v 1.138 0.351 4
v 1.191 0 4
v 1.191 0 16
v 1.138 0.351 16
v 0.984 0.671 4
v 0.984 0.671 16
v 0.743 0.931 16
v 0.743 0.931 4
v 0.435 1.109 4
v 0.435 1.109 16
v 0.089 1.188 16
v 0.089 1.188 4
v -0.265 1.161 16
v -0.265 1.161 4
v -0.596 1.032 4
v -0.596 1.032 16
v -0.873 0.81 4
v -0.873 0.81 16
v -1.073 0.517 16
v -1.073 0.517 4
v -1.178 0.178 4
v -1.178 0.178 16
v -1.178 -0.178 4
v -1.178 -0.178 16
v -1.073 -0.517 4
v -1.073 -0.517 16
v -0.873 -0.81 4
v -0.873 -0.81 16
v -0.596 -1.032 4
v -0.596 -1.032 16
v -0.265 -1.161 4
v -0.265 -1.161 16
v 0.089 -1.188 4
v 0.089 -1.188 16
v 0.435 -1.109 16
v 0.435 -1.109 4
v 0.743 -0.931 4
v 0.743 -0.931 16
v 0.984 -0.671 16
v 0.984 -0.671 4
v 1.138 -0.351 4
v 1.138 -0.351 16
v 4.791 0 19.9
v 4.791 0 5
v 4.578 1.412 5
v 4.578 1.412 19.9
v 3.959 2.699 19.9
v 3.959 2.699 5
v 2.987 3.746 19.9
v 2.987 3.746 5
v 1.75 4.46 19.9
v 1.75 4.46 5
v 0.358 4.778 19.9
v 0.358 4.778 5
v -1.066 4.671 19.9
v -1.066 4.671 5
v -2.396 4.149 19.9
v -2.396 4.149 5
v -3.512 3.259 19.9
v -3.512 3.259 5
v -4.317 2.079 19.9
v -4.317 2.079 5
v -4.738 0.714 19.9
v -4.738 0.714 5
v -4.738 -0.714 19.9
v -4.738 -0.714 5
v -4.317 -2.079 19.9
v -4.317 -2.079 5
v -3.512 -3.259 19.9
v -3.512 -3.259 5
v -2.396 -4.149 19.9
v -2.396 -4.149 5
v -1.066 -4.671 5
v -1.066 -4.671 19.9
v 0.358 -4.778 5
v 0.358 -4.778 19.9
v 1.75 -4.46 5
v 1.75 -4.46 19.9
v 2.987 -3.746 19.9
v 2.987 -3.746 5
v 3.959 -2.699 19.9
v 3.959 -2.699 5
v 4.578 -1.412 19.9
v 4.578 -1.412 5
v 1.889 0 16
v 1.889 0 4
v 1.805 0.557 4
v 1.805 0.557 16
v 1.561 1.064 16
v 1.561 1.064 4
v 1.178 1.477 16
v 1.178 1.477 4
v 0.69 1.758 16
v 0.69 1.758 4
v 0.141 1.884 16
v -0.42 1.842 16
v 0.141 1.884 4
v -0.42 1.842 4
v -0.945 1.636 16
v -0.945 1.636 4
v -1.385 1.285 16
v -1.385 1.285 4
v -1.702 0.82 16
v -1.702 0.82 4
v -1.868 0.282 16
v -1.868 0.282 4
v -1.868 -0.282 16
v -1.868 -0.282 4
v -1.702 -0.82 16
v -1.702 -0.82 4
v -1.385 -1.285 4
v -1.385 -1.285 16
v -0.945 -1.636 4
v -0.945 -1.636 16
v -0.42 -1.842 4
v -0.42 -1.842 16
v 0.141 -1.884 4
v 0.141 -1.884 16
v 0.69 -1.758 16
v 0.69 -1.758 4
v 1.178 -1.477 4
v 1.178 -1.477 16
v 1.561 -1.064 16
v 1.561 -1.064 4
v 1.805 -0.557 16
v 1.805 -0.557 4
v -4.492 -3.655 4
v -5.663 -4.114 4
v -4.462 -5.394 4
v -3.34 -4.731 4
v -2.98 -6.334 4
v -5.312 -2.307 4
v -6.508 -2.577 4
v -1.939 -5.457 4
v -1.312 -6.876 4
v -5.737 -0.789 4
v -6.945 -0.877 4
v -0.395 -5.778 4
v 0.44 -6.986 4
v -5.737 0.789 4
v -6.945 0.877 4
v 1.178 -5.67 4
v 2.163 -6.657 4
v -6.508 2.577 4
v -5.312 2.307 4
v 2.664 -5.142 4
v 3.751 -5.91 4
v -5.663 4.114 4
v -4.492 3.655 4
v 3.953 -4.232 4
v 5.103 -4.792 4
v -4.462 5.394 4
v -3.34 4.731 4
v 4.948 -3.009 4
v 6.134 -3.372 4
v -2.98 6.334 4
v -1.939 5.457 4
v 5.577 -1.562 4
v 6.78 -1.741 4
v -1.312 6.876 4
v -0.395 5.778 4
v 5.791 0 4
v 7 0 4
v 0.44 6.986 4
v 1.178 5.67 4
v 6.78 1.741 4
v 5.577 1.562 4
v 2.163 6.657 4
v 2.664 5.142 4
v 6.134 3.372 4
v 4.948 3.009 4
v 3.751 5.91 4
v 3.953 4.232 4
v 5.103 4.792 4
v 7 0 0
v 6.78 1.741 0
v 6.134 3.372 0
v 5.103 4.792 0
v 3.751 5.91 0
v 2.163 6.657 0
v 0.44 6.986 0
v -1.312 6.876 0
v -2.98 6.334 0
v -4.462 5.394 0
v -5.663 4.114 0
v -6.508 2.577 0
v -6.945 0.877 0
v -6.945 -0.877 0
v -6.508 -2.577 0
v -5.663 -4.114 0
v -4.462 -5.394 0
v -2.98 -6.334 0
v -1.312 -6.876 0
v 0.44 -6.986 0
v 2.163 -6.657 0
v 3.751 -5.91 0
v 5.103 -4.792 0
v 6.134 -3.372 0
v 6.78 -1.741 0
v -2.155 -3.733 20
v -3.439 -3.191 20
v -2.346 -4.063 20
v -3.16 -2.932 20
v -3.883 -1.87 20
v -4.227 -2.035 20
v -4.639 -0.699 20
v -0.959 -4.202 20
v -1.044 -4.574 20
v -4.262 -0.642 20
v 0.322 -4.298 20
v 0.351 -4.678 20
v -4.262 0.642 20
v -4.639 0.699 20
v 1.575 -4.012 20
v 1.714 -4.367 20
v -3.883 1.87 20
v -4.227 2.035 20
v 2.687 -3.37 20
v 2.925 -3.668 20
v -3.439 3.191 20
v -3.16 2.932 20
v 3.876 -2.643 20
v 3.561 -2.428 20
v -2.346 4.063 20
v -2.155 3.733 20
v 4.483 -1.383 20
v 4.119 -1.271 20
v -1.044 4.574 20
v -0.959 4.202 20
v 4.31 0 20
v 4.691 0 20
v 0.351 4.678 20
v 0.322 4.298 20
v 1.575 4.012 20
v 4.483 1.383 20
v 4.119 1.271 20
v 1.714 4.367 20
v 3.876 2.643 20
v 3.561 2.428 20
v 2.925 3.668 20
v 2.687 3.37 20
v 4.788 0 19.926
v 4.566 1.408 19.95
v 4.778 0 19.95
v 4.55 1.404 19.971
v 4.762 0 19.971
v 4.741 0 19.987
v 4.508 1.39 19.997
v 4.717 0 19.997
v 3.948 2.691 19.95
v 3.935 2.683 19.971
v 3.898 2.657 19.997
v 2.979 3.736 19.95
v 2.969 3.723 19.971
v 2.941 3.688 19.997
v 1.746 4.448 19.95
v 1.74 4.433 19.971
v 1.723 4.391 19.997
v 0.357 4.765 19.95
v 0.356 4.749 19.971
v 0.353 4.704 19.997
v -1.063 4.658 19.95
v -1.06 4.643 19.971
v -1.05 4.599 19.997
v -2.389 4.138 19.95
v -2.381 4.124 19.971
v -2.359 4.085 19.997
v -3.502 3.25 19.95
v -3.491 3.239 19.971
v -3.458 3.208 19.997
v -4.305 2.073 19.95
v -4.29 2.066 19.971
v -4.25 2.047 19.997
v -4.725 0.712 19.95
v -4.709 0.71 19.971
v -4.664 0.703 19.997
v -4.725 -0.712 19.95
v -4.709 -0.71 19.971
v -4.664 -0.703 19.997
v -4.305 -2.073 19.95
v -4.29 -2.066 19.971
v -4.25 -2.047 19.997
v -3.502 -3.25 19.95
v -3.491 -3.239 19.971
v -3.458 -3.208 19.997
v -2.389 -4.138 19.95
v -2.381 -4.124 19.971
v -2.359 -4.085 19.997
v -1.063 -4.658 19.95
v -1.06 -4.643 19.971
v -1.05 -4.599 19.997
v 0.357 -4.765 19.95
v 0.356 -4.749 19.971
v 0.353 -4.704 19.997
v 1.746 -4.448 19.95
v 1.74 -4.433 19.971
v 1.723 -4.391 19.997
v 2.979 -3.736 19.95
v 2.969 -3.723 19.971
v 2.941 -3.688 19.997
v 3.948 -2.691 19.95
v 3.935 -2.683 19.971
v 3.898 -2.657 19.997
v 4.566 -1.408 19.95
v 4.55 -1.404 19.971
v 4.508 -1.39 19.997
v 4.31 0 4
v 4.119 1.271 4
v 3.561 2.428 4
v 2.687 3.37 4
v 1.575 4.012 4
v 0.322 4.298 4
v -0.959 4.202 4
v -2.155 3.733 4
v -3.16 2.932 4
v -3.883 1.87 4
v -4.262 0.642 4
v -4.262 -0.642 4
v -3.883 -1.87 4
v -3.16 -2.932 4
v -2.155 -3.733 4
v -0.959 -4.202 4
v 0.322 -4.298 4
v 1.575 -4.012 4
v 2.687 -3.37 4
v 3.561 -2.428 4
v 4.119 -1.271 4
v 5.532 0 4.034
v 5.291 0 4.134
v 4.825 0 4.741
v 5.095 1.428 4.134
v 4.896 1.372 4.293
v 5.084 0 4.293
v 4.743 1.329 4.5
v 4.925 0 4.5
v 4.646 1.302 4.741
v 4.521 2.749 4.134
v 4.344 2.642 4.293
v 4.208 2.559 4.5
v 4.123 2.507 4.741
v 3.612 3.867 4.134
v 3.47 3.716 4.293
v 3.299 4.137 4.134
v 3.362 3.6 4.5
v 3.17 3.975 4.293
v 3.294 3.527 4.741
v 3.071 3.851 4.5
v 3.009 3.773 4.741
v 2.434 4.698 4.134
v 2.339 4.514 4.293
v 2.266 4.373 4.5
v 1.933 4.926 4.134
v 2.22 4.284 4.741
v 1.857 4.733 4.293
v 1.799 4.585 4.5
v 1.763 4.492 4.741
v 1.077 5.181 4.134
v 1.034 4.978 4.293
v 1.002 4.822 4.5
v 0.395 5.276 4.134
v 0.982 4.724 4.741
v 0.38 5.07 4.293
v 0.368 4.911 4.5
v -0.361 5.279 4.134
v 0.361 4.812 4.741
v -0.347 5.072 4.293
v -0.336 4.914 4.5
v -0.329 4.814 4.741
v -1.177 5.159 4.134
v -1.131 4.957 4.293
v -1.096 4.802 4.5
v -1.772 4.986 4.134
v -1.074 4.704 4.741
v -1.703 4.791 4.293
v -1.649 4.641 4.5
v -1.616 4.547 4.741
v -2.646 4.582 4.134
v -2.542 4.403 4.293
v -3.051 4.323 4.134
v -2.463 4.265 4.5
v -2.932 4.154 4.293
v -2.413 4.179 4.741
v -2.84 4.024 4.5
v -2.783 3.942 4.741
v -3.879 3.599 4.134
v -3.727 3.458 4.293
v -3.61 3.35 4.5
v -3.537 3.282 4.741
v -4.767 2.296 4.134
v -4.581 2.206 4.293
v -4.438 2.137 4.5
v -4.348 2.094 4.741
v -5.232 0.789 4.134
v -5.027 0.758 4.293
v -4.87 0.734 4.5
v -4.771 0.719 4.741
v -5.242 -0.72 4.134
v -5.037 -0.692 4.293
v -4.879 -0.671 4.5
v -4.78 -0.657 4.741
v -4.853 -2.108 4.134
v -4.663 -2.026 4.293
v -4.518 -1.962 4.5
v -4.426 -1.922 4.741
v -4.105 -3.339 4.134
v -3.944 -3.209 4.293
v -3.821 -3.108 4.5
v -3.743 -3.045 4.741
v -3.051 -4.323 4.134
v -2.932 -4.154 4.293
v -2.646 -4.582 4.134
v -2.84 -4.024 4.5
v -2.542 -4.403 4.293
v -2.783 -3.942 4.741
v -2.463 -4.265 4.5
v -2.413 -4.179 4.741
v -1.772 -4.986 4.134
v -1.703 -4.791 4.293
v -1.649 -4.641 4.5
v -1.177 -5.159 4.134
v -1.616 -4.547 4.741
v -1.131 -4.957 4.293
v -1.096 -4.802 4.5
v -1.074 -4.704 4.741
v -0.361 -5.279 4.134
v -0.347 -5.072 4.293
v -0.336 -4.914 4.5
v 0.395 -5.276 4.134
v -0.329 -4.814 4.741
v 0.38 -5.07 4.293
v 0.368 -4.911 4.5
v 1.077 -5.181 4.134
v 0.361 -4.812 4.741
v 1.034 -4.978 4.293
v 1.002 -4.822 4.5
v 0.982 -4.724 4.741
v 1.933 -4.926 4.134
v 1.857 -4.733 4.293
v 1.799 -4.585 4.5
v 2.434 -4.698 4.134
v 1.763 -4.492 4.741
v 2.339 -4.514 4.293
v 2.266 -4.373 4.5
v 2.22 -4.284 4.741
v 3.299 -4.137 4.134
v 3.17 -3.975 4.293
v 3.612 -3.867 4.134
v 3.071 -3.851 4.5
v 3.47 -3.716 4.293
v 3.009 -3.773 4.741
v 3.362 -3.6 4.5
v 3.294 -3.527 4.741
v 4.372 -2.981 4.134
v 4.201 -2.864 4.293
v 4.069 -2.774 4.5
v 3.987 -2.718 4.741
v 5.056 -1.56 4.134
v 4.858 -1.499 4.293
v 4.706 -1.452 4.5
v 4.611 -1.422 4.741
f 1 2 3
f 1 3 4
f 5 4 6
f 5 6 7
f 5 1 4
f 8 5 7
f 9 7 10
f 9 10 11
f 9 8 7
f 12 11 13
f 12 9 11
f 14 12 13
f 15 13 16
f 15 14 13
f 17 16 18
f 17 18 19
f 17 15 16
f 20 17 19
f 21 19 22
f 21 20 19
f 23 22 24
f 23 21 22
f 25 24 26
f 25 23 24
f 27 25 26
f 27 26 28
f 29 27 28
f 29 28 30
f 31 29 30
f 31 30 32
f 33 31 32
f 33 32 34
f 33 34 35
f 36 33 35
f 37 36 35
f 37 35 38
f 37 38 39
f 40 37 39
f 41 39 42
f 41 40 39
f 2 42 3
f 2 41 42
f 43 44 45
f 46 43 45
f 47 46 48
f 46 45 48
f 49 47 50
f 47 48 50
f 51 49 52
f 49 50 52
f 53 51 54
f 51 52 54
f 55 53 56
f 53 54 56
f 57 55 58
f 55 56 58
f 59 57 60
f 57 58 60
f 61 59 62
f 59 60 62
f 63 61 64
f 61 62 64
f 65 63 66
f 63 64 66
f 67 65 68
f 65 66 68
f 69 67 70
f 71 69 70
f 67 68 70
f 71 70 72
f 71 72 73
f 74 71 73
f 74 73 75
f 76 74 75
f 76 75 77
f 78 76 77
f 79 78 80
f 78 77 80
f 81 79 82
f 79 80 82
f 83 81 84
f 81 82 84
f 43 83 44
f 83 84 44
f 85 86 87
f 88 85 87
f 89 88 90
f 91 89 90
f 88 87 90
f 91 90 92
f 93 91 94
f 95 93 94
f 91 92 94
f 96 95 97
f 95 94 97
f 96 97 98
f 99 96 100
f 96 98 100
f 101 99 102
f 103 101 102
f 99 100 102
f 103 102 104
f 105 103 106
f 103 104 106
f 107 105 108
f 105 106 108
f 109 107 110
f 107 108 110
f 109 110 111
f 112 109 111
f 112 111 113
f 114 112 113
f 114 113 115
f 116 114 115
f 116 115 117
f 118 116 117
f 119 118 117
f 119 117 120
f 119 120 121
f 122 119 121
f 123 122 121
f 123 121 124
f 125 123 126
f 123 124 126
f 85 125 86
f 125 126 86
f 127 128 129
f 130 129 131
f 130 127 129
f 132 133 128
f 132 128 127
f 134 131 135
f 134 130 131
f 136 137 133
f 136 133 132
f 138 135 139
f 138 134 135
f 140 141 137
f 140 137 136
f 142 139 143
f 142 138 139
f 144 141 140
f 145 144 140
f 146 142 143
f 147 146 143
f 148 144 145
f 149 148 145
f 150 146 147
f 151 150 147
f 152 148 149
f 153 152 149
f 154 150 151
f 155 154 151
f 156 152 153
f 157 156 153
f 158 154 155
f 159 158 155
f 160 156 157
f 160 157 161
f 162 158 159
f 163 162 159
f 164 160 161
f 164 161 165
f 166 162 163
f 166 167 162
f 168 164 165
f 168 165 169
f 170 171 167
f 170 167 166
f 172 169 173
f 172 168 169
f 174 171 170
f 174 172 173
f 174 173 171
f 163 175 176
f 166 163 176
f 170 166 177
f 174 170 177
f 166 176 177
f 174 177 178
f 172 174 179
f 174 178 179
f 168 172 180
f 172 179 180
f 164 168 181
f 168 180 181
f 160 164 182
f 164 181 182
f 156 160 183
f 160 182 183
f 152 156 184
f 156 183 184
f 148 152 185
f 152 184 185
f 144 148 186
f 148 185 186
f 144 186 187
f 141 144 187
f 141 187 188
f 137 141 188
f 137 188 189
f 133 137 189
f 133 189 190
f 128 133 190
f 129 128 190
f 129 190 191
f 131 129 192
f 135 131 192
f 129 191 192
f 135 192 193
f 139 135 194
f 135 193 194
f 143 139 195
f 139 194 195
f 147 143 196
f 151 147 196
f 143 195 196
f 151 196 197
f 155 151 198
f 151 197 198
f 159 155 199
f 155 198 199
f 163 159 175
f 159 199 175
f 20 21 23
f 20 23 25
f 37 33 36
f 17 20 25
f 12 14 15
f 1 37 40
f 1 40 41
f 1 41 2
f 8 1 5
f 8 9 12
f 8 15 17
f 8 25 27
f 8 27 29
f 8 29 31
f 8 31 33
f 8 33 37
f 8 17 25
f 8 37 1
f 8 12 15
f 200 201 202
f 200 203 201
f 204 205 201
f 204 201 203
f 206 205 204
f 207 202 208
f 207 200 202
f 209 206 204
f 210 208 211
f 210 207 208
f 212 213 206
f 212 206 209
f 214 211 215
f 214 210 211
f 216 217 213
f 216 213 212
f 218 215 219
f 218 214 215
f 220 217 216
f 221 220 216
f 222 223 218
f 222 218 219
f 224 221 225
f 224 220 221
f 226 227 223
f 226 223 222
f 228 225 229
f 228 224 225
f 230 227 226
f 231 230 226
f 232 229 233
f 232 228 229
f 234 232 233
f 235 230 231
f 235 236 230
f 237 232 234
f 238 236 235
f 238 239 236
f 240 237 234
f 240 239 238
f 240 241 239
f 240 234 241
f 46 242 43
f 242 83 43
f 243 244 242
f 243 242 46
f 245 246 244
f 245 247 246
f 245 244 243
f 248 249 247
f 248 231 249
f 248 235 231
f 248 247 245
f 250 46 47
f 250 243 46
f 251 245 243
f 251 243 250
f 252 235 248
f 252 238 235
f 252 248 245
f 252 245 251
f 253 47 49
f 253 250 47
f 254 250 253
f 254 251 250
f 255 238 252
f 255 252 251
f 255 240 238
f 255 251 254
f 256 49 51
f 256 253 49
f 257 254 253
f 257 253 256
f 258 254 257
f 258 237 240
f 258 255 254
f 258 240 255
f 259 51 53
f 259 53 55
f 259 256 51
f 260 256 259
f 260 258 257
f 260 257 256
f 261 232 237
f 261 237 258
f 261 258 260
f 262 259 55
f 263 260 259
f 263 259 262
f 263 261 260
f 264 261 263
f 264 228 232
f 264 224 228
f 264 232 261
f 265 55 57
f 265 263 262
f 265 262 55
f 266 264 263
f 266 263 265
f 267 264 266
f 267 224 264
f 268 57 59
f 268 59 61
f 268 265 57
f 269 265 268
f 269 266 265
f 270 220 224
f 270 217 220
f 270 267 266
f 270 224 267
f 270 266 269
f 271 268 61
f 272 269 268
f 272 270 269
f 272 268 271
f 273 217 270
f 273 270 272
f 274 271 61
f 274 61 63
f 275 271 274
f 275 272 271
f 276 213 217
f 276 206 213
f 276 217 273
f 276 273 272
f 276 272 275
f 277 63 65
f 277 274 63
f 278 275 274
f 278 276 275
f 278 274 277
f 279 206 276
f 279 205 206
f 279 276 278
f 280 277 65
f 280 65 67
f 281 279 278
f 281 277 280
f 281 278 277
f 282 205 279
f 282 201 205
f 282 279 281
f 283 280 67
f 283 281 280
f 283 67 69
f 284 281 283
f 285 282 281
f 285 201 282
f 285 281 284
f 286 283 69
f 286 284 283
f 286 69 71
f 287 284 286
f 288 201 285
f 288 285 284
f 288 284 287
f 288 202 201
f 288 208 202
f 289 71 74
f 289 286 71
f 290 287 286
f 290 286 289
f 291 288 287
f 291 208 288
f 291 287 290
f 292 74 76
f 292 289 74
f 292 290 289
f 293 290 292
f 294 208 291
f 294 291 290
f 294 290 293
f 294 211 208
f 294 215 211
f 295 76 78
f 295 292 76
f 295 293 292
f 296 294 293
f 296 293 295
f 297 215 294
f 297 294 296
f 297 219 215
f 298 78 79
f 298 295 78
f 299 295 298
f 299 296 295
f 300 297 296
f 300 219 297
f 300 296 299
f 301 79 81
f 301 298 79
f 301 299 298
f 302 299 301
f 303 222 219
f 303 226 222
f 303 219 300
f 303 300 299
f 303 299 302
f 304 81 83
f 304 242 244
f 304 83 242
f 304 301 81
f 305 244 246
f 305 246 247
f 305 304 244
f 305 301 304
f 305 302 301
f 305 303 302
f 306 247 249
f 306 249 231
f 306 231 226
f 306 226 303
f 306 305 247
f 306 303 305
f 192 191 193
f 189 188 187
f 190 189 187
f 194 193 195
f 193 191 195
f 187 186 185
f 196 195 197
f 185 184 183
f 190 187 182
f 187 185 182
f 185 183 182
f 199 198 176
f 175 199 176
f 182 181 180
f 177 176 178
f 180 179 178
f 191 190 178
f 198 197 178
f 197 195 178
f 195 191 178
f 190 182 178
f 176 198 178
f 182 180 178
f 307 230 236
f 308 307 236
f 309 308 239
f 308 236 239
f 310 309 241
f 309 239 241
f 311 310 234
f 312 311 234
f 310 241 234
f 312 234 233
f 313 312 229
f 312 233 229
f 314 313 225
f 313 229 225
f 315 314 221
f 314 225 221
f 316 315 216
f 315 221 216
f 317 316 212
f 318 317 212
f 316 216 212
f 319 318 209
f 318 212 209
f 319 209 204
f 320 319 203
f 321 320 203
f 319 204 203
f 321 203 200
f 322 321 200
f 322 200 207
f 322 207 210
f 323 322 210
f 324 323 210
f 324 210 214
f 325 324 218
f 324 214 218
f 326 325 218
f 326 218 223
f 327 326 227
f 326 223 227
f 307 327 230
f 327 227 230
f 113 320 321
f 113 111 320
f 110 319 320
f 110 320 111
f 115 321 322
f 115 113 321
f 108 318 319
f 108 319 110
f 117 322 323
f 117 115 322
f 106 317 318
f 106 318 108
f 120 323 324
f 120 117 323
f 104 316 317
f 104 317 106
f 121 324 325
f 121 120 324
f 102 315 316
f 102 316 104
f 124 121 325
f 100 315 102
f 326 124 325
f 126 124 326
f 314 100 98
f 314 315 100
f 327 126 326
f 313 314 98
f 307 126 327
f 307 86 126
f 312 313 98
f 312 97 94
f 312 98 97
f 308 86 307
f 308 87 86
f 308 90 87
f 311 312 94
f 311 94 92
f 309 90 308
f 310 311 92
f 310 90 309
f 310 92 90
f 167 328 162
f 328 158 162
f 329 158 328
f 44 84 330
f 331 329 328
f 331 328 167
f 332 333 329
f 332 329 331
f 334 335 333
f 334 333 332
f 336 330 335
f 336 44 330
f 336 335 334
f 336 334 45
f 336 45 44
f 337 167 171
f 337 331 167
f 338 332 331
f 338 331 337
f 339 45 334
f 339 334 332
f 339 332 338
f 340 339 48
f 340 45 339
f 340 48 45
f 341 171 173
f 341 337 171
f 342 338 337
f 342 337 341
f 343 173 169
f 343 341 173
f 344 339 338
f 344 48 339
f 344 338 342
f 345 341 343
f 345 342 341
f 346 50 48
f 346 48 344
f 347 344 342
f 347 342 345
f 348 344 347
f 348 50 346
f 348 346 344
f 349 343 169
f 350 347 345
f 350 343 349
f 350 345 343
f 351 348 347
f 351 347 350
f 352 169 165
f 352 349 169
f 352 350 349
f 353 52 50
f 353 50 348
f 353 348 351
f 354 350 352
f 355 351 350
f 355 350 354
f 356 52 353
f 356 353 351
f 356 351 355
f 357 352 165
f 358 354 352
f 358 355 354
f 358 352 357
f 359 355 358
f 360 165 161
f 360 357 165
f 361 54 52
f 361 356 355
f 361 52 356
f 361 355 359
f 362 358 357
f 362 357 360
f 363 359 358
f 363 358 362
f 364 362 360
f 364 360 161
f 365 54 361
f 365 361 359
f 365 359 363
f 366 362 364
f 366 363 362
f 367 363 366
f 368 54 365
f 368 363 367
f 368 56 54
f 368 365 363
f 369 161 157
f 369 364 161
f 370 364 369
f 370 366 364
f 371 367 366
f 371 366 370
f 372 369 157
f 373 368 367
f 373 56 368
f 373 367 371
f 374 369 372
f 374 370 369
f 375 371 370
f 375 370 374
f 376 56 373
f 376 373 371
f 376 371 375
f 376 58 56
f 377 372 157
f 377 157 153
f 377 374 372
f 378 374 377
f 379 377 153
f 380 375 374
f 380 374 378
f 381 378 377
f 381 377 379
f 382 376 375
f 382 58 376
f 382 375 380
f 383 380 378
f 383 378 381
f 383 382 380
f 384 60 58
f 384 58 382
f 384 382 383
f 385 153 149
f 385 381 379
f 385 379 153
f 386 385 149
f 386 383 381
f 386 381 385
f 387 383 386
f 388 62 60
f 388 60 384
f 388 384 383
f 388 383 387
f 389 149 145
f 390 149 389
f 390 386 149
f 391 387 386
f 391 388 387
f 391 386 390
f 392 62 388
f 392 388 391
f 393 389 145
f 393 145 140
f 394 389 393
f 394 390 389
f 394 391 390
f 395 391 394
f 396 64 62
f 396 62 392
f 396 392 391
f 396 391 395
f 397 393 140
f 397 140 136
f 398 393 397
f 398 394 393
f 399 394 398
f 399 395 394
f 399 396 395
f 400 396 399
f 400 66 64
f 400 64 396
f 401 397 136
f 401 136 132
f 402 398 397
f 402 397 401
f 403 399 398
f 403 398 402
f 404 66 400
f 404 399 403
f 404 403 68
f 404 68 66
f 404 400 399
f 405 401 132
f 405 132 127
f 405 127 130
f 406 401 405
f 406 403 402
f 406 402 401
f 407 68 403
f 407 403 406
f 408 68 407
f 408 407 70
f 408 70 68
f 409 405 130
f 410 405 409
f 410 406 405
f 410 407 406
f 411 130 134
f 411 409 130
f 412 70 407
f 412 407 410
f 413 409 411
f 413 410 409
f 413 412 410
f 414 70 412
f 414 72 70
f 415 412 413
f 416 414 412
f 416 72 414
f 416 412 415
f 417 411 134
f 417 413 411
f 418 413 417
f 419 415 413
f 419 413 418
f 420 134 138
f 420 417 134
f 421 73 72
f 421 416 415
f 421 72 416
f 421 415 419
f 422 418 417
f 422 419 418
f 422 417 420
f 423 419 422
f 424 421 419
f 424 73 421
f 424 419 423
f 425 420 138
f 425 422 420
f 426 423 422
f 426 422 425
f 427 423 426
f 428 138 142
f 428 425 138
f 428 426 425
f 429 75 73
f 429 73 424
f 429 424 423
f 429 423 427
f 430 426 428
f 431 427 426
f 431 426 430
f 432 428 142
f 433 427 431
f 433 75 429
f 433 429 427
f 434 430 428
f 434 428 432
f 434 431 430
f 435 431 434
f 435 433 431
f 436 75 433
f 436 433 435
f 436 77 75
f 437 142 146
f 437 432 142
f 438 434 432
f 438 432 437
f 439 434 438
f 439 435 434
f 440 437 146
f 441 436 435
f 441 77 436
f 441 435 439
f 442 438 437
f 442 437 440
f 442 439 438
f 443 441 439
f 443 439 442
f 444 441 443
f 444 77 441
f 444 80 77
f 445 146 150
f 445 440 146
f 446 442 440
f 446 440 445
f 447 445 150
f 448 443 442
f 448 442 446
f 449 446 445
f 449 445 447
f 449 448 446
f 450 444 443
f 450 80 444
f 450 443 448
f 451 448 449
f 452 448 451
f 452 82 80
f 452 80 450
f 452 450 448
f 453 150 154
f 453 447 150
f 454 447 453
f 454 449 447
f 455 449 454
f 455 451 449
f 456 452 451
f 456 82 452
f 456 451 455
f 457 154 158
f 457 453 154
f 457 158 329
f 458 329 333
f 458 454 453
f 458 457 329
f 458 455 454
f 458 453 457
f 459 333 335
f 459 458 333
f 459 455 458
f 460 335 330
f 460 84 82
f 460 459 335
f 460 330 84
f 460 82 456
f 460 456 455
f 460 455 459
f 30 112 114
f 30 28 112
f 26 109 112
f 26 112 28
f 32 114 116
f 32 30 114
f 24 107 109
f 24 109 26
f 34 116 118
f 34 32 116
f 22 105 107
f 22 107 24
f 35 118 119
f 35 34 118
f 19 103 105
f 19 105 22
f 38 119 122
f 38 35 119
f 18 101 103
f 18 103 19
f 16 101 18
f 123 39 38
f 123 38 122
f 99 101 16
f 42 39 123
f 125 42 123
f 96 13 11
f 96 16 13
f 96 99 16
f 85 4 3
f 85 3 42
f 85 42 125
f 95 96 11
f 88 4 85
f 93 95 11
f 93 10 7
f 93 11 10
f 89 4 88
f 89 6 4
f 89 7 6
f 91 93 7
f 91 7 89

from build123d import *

# Parameters (mm, degrees)
SKETCH1_R           = 7
BOSS_EXTRUDE1_DEPTH = 4
SKETCH2_R           = 4.791287292
BOSS_EXTRUDE2_DEPTH = 16
SKETCH3_R           = 4.310359808
CUT_EXTRUDE1_DEPTH  = 16
SKETCH4_R           = 1.889075337
SKETCH4_R_2         = 1.191130081
BOSS_EXTRUDE3_DEPTH = 12
FILLET1_R           = 1
FILLET2_R           = 0.1


with BuildPart() as part:
    # Sketch1 → Boss-Extrude1 (new body)
    with BuildSketch(Plane.XY):
        Circle(SKETCH1_R)
    extrude(amount=BOSS_EXTRUDE1_DEPTH)

    # Sketch2 → Boss-Extrude2 (add)
    with BuildSketch(Plane.XY.offset(4)):
        Circle(SKETCH2_R)
    extrude(amount=BOSS_EXTRUDE2_DEPTH)

    # Sketch3 → Cut-Extrude1 (cut)
    with BuildSketch(Plane.XY.offset(20)):
        Circle(SKETCH3_R)
    extrude(amount=-CUT_EXTRUDE1_DEPTH, mode=Mode.SUBTRACT)

    # Sketch4 → Boss-Extrude3 (add)
    with BuildSketch(Plane.XY.offset(4)):
        Circle(SKETCH4_R)
        Circle(SKETCH4_R_2, mode=Mode.SUBTRACT)
    extrude(amount=BOSS_EXTRUDE3_DEPTH)

    # Fillet1
    fillet1_edges = [part.edges().sort_by_distance(p)[0] for p in [
        (-4.791287292, 0, 4),
    ]]
    fillet(fillet1_edges, radius=FILLET1_R)

    # Fillet2
    fillet2_edges = [part.edges().sort_by_distance(p)[0] for p in [
        (-4.791287292, 0, 20),
    ]]
    fillet(fillet2_edges, radius=FILLET2_R)


solid = part.part
